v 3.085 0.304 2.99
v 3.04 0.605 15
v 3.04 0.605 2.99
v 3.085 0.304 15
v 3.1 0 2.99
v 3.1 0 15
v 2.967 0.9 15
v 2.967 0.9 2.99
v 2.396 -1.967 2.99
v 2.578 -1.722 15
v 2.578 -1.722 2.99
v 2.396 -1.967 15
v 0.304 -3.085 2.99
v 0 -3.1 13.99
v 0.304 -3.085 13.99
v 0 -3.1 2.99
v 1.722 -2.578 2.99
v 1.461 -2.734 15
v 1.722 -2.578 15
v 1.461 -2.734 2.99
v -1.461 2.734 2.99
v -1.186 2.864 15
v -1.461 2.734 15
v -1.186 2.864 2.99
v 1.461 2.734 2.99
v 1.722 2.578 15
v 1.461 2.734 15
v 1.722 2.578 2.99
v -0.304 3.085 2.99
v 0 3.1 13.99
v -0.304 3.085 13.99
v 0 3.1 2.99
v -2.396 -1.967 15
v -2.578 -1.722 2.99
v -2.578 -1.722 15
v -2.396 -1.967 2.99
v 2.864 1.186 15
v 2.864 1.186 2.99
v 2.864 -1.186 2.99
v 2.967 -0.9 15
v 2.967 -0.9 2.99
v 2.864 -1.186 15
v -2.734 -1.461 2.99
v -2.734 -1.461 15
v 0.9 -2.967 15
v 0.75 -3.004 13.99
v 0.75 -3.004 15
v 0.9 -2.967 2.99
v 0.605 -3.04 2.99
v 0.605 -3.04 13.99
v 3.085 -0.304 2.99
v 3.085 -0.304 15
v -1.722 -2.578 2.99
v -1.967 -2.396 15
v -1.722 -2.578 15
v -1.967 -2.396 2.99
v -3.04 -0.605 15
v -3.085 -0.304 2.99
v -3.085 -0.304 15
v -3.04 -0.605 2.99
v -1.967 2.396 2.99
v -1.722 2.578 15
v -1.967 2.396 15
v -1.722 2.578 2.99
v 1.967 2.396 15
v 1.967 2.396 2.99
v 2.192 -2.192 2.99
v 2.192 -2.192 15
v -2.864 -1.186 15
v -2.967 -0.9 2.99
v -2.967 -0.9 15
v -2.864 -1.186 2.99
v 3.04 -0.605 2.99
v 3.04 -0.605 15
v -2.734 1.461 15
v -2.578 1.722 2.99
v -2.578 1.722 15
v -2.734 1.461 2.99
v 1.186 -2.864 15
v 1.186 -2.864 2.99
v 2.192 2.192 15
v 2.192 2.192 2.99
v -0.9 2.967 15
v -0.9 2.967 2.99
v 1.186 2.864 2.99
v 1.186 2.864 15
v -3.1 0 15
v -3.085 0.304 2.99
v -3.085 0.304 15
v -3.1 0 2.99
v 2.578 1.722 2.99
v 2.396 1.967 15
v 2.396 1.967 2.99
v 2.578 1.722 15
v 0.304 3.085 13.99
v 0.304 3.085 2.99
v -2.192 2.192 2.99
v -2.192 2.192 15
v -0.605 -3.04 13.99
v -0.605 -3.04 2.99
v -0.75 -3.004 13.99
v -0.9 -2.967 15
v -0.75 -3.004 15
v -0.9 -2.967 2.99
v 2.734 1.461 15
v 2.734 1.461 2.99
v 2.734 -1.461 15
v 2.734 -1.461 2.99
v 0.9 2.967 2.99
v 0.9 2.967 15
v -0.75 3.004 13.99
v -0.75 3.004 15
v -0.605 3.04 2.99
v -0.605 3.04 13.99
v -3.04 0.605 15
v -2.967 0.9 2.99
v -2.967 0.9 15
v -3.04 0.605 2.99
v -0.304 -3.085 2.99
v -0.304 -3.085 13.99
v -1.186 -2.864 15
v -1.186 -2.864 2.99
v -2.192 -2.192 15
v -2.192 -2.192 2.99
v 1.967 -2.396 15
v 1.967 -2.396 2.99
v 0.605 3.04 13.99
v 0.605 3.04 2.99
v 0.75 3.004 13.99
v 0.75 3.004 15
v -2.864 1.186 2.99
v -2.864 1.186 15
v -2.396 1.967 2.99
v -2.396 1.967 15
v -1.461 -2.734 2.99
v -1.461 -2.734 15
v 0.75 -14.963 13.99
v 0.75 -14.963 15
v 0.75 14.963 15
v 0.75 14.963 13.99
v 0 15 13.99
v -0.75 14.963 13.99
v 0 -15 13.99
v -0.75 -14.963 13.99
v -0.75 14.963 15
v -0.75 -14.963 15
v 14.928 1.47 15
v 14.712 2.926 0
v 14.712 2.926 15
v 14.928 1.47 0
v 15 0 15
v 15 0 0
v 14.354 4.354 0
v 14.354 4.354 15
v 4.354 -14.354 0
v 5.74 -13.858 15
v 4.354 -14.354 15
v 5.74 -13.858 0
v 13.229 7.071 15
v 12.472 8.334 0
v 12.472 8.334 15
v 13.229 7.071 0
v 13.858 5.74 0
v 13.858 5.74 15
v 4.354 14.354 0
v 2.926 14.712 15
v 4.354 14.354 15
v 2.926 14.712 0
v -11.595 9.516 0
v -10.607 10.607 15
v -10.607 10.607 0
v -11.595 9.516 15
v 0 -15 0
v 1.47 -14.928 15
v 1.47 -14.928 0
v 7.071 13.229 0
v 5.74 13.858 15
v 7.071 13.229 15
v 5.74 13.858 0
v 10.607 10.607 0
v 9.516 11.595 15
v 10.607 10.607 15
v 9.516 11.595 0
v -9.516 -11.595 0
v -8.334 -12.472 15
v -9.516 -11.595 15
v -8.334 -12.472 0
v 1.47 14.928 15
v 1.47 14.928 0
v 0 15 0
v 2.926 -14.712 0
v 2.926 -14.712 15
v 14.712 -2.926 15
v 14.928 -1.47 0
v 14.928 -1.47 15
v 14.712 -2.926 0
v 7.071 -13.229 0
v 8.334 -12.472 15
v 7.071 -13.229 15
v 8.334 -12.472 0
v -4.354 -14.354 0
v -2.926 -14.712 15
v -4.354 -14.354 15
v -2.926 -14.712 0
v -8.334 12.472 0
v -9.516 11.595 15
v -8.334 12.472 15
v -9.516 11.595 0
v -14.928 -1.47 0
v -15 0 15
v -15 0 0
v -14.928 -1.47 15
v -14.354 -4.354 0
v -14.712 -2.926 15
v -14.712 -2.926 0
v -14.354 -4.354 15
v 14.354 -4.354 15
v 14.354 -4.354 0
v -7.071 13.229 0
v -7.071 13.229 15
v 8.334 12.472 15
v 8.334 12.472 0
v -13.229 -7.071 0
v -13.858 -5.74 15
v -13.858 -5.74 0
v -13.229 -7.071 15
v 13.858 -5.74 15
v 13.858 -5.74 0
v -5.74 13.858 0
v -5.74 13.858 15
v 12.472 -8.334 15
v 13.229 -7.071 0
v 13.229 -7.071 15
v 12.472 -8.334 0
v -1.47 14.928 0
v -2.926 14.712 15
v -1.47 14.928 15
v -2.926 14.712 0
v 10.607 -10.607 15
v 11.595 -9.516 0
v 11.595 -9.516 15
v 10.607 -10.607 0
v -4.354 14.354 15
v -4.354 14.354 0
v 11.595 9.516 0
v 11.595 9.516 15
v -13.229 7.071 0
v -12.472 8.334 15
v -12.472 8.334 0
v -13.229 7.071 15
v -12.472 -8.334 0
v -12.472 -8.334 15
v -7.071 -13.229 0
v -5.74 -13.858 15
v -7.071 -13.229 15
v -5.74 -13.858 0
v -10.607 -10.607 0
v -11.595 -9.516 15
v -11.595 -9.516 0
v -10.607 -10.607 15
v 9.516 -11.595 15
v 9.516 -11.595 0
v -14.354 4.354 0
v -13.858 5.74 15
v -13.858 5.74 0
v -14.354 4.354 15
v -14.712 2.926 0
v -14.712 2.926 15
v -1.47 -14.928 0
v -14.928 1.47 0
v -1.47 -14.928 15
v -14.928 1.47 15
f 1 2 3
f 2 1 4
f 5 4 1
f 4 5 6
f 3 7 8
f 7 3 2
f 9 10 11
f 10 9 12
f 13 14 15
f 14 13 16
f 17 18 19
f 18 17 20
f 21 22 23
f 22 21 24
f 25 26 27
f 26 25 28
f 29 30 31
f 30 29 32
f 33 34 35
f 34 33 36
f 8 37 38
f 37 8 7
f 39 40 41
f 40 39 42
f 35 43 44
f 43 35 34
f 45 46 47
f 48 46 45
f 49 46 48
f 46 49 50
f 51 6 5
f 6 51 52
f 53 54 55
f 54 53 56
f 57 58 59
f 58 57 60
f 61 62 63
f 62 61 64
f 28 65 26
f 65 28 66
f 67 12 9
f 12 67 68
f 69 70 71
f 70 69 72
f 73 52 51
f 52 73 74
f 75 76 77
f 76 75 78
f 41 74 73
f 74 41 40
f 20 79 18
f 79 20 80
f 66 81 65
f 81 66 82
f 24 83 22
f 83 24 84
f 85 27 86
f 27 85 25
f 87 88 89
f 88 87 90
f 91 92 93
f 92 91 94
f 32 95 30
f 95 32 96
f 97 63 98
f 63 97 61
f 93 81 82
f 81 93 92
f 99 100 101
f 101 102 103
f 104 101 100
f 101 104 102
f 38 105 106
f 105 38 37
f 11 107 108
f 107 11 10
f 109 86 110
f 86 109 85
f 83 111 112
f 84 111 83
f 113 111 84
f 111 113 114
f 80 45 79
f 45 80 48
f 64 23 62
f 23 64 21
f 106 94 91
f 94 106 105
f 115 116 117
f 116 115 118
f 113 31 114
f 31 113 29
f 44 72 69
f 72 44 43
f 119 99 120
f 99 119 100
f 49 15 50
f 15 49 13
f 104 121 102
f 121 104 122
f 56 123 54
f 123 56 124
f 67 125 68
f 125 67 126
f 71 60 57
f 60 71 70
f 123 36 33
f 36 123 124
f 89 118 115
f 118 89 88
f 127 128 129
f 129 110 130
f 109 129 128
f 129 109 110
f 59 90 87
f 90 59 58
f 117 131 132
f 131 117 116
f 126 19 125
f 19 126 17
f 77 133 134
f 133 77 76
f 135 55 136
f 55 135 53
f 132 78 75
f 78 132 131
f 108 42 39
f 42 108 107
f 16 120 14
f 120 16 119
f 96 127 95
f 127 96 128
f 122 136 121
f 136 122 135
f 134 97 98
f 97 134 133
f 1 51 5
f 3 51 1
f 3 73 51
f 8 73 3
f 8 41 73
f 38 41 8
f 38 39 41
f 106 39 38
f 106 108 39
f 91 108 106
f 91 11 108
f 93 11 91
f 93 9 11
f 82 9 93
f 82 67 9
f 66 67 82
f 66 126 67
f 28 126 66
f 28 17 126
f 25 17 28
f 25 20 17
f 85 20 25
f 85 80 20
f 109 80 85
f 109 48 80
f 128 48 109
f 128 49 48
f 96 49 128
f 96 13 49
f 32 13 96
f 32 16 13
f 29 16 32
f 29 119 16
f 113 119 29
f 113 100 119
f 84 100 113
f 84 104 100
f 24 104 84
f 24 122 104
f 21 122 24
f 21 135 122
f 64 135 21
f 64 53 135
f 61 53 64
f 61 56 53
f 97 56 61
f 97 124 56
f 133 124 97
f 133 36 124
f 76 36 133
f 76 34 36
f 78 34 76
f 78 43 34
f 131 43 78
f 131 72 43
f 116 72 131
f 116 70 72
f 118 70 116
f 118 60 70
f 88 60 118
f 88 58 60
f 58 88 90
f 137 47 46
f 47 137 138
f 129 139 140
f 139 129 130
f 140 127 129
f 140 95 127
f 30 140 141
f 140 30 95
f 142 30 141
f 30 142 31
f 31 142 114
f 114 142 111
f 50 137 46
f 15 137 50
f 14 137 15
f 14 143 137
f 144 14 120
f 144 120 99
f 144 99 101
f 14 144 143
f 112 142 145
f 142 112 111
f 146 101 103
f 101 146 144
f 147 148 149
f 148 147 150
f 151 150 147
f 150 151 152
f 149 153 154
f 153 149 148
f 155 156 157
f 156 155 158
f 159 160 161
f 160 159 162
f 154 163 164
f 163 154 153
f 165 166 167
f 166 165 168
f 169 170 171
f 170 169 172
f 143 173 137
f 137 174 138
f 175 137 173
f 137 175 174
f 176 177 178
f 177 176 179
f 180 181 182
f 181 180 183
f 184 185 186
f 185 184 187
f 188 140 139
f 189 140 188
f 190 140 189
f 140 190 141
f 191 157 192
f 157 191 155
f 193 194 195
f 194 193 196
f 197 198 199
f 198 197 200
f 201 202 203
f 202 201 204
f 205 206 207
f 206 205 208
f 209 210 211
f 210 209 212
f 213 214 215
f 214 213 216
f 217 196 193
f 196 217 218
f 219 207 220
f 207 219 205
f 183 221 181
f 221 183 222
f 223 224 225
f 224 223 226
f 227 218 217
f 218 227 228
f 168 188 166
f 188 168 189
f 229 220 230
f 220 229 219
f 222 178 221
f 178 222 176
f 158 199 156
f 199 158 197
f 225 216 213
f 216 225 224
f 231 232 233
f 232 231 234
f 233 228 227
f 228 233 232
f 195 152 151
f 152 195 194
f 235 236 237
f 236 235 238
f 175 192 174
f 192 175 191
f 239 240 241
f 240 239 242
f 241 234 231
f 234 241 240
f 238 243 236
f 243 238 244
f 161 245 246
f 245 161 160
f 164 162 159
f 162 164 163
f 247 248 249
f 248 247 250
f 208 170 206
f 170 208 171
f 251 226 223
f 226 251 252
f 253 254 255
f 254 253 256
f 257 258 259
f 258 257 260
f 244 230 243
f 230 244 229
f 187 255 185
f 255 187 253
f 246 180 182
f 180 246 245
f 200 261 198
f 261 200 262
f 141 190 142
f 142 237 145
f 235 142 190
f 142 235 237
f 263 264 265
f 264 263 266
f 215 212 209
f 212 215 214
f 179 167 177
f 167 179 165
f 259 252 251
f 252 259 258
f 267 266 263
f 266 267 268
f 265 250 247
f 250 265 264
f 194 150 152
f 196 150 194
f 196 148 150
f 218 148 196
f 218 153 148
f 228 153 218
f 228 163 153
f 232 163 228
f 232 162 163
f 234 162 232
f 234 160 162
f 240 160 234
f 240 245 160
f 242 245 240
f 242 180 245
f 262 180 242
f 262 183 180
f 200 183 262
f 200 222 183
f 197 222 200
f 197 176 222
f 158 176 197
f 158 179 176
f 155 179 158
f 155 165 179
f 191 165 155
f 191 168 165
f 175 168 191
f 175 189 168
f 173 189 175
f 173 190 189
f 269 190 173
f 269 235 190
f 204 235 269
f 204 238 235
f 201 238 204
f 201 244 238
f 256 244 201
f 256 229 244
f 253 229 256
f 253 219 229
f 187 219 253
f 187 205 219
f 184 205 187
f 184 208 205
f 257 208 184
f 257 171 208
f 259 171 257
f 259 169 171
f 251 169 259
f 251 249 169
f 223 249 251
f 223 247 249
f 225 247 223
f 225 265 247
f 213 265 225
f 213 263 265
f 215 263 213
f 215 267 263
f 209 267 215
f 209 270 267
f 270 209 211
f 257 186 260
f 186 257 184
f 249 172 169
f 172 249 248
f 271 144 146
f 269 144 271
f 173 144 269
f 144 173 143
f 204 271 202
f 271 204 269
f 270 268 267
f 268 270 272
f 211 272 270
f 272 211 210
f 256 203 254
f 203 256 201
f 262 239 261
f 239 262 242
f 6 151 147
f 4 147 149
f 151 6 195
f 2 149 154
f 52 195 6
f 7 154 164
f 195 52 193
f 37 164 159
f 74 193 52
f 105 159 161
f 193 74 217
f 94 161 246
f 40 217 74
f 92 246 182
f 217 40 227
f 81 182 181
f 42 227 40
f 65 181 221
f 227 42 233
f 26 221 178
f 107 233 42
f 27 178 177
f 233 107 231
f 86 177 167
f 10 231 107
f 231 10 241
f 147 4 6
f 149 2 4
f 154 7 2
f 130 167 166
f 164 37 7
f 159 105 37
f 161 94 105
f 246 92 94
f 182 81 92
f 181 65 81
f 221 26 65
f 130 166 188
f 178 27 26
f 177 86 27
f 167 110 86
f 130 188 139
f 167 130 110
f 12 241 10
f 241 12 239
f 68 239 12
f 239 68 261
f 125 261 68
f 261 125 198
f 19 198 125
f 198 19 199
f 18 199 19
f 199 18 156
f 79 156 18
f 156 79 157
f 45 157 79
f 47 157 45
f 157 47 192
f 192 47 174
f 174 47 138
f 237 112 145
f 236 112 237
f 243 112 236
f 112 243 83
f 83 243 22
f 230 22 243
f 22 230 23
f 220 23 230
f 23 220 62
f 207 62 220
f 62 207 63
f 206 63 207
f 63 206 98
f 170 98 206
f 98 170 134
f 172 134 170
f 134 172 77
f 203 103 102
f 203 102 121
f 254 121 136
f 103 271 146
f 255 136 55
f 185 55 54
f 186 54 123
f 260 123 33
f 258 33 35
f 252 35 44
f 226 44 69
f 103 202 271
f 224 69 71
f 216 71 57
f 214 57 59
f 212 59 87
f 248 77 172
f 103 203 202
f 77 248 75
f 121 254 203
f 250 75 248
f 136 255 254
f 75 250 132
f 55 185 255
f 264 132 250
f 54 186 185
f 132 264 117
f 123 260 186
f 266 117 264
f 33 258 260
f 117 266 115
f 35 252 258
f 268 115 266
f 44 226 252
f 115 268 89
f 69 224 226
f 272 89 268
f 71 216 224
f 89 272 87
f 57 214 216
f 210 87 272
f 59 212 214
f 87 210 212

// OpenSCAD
// Built by bench/smallmodels/features/compiler.py from a list of features.
$fn = 64;
difference() {
  union() {
    translate([0, 0, 0]) cylinder(d = 30, h = 15);
  }
  union() {
    translate([0, 0, 2.99]) rotate([0, 0, 0]) cylinder(d = 6.2, h = 12.02);
    translate([0, 0, 13.99]) rotate([0, 0, 0]) translate([-0.75, -15, 0]) cube([1.5, 30, 1.02]);
  }
}
